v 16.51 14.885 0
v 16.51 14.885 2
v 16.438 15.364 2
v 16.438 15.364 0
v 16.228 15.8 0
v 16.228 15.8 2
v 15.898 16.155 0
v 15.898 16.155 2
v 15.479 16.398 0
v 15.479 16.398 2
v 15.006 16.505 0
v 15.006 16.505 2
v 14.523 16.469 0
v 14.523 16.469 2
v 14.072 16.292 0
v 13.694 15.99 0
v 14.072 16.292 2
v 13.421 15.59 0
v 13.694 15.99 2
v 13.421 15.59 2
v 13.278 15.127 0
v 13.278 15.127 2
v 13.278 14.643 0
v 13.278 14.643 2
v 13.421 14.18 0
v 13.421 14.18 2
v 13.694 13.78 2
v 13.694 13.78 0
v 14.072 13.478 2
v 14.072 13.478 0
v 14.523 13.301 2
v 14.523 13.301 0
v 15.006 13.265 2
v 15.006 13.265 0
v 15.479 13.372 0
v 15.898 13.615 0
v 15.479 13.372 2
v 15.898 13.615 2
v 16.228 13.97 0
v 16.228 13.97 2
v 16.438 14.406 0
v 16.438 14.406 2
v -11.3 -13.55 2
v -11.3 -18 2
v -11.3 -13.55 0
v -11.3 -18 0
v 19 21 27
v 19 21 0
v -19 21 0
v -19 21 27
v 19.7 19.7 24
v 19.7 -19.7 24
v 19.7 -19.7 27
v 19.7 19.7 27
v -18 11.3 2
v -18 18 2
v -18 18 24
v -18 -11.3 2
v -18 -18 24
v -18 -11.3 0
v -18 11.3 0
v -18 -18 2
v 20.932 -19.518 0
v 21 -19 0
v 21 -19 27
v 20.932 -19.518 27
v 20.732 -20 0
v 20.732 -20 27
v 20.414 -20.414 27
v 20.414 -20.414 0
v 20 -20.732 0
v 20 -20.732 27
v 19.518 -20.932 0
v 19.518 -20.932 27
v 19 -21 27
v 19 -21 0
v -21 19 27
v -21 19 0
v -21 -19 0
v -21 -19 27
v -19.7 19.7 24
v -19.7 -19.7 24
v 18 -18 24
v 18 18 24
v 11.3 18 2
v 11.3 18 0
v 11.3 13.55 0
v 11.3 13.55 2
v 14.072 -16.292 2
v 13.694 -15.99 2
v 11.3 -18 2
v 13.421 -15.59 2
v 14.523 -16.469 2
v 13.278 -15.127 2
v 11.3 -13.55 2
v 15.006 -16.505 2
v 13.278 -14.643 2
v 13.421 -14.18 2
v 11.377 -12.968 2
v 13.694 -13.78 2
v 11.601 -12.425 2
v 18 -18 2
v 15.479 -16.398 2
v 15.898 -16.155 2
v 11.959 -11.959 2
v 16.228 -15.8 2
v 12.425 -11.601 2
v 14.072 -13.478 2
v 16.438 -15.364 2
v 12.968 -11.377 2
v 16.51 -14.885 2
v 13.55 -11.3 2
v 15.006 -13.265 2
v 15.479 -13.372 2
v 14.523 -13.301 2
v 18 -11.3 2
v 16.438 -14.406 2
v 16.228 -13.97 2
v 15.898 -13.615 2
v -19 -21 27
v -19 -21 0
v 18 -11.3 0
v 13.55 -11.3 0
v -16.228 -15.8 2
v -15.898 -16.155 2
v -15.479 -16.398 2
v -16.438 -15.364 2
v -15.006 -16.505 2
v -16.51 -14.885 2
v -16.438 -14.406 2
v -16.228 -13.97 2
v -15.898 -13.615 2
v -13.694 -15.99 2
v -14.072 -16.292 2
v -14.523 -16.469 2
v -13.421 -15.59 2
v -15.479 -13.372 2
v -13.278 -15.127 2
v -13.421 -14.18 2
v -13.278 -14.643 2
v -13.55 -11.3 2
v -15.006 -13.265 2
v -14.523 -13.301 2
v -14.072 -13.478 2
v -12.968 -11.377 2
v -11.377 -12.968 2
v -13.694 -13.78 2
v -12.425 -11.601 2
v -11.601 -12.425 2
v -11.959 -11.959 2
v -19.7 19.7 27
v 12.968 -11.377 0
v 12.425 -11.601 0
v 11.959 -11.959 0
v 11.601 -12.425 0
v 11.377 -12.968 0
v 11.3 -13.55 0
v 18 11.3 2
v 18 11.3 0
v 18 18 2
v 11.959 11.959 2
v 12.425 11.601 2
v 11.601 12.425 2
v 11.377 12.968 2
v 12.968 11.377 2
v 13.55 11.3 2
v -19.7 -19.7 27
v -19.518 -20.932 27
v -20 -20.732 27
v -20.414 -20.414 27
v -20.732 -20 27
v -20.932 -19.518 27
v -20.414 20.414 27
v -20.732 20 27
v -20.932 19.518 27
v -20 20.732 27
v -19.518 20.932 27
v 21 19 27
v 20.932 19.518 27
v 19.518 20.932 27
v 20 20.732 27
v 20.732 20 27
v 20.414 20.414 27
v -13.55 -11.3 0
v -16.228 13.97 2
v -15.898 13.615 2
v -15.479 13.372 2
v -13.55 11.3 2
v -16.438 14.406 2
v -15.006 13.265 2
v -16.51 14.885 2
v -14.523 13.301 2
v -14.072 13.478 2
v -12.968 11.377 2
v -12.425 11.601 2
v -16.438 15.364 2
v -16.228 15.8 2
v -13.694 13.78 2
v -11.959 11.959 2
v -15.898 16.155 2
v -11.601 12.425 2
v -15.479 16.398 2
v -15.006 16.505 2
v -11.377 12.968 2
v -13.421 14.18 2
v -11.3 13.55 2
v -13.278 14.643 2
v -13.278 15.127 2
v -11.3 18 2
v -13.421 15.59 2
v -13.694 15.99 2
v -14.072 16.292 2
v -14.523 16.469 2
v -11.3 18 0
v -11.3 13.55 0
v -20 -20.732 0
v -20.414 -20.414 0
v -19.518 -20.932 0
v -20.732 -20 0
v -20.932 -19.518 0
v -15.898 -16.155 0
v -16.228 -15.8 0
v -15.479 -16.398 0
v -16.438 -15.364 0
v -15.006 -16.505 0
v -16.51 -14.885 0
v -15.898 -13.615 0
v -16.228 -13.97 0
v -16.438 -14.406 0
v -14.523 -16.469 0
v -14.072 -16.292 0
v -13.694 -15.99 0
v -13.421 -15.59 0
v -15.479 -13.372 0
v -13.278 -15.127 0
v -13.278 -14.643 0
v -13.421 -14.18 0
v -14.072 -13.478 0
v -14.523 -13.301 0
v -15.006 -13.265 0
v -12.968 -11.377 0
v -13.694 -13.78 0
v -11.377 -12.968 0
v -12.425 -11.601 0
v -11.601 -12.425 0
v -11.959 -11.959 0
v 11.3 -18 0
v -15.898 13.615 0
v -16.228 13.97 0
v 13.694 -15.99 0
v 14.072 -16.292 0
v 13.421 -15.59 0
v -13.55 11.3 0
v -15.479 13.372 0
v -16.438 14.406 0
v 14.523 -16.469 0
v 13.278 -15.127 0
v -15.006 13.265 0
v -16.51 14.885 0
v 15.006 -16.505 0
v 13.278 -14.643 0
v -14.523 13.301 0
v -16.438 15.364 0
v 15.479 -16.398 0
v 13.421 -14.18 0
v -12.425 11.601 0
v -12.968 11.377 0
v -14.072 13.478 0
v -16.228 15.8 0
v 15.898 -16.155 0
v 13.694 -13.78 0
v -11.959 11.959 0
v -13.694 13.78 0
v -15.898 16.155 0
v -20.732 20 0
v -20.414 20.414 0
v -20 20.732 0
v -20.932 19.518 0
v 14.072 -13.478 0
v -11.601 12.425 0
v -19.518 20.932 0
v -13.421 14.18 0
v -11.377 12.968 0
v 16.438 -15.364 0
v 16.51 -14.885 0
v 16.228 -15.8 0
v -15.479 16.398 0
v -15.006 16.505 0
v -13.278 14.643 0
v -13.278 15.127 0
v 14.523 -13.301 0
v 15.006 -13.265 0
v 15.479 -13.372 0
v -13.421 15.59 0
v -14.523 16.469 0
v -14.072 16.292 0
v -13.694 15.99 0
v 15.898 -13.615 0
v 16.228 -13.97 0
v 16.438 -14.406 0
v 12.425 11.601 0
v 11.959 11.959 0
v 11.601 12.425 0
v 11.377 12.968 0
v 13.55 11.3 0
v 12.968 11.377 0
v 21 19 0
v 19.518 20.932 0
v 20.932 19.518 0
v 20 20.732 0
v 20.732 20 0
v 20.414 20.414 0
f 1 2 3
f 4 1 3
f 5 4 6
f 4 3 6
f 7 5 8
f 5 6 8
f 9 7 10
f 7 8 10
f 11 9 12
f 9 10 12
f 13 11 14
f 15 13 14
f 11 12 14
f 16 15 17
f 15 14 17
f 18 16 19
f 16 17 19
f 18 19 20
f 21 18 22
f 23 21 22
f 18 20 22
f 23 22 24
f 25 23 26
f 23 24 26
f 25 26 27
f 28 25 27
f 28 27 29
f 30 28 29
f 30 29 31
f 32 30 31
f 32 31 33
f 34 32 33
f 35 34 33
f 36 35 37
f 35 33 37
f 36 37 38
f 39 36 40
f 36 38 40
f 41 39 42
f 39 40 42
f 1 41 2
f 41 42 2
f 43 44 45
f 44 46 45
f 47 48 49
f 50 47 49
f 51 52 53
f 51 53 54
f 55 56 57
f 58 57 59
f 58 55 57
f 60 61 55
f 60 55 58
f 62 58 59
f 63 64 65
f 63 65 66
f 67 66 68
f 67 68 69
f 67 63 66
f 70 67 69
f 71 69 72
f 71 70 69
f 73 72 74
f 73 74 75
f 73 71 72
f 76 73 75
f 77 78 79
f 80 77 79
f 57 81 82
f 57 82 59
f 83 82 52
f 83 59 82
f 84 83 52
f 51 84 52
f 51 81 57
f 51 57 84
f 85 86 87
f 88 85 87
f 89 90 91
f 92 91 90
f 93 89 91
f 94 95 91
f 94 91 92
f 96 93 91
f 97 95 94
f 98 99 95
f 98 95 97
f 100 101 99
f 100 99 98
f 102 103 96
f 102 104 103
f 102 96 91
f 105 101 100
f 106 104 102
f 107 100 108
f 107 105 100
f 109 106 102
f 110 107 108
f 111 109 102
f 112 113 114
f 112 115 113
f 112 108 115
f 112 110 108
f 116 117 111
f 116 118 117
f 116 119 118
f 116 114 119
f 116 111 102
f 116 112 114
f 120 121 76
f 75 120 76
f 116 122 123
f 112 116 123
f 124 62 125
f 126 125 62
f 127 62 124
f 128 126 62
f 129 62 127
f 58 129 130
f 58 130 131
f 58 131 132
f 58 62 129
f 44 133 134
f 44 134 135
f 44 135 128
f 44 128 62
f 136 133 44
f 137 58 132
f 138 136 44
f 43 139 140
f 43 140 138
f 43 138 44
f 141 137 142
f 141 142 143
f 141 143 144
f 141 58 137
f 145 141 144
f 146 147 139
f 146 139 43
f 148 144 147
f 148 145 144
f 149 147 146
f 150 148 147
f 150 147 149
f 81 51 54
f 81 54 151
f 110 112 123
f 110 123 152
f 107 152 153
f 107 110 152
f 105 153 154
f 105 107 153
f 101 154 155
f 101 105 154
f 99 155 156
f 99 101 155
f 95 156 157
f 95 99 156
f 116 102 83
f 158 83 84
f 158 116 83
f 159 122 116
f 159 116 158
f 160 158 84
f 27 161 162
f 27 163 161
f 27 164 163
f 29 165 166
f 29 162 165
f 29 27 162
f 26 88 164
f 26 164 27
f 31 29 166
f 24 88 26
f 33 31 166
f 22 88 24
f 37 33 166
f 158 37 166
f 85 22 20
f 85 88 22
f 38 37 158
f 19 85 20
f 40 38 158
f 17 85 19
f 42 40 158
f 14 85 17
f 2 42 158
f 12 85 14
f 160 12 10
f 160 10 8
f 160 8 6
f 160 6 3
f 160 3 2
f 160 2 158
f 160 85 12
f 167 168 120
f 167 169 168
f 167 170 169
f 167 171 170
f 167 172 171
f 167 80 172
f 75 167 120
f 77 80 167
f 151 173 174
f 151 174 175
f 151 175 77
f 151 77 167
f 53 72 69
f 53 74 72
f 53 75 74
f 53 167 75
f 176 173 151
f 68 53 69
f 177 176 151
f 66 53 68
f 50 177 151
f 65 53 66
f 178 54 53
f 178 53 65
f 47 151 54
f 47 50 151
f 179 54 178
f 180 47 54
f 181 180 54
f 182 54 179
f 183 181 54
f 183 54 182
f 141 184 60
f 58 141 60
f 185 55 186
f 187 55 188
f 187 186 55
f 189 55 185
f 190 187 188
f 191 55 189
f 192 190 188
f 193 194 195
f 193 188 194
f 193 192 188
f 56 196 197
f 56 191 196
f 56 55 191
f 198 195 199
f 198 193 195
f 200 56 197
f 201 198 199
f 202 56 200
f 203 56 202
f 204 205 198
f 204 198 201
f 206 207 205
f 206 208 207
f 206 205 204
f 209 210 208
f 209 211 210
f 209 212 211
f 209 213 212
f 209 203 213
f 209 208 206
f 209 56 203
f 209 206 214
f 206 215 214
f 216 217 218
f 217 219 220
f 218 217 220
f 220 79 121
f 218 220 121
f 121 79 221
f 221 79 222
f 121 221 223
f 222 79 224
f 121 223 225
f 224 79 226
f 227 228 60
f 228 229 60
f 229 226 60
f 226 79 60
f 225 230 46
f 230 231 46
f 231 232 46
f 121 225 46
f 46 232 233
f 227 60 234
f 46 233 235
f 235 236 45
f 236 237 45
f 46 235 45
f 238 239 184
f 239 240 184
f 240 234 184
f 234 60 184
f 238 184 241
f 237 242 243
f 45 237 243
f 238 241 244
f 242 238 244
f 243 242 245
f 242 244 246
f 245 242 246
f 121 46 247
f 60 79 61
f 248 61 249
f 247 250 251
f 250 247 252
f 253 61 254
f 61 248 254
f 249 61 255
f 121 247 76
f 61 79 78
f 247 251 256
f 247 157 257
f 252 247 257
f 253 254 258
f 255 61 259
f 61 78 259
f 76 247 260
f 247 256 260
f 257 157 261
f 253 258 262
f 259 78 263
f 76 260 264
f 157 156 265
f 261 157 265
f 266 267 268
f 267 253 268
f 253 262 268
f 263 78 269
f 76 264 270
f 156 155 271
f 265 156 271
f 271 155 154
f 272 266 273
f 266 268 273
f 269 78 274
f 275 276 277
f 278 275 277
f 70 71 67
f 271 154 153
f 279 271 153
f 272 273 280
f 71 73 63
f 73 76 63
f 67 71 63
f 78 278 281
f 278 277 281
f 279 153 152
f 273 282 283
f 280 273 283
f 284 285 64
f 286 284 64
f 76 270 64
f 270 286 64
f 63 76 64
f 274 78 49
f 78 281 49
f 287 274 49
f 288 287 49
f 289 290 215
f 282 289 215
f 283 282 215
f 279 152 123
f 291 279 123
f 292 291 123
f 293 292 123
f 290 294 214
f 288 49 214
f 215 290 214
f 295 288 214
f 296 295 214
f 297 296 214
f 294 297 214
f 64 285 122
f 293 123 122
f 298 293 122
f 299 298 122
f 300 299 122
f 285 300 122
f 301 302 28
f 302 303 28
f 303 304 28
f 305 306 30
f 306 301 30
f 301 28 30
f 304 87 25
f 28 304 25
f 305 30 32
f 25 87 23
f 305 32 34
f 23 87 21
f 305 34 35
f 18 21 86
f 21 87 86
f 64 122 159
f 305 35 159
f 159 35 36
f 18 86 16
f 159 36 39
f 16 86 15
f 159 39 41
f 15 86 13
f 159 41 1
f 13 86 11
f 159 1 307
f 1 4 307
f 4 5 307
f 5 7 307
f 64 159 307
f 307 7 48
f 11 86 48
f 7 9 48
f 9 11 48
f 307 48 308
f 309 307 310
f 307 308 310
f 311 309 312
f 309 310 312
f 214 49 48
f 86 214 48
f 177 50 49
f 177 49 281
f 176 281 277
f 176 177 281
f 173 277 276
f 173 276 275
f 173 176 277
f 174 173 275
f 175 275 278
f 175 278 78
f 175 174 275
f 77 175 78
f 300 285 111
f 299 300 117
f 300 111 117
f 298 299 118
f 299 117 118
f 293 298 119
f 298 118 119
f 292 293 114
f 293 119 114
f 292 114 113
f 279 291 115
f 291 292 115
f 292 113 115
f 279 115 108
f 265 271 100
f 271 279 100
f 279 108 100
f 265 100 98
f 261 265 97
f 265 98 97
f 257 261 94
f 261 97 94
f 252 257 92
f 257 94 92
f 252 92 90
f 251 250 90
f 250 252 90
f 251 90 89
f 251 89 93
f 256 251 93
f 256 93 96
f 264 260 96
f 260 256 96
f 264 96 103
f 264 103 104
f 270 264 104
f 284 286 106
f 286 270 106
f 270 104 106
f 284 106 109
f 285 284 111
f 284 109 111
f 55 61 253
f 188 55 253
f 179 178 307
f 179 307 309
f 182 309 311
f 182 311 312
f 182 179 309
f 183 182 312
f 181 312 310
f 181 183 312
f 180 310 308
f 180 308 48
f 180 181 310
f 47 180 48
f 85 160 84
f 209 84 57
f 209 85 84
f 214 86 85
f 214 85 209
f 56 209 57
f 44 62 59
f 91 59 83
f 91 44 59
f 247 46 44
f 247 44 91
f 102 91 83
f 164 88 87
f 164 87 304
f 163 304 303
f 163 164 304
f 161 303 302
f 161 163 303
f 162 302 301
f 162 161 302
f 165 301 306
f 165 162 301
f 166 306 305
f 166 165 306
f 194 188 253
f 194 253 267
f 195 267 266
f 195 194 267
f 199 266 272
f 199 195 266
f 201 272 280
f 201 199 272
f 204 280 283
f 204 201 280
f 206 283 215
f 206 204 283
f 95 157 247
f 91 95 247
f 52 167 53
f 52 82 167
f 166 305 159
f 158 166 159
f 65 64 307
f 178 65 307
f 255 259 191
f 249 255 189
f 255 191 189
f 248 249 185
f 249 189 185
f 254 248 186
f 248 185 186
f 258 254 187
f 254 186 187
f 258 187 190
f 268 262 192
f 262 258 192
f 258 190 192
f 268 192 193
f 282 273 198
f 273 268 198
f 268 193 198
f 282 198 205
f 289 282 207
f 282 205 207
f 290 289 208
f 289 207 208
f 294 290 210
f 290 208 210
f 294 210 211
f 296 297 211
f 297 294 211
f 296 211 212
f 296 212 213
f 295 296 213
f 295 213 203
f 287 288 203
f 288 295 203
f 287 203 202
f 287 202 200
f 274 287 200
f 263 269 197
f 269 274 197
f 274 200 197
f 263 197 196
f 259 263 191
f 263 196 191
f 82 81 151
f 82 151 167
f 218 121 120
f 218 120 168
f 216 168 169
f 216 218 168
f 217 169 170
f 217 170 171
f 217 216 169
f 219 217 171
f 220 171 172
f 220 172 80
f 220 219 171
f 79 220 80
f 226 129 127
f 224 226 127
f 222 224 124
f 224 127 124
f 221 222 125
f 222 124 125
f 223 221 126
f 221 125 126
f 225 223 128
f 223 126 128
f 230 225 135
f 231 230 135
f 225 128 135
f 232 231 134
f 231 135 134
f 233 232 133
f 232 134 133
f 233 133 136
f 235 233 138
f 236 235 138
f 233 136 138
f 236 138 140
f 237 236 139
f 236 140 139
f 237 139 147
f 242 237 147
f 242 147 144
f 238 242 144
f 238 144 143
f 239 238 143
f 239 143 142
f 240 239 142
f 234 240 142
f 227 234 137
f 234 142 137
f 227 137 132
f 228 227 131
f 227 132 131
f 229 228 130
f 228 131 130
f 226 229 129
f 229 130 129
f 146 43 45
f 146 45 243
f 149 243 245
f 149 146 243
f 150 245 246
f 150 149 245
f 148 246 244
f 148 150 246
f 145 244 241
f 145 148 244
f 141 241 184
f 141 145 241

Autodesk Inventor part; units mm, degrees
ref_plane "YZ Plane" through (0, 0, 0) normal (1, 0, 0) x (0, 1, 0)
ref_plane "XZ Plane" through (0, 0, 0) normal (0, 1, 0) x (-1, 0, 0)
ref_plane "XY Plane" through (0, 0, 0) normal (0, 0, 1) x (1, 0, 0)
sketch "Sketch1" plane through (0, 0, 0) normal (0, 0, 1) x (1, 0, 0)
  line L0 (-21, -21) -> (21, -21)
  line L1 (21, -21) -> (21, 21)
  line L2 (21, 21) -> (-21, 21)
  line L3 (-21, 21) -> (-21, -21)
  line L4 (-21, -21) -> (21, 21) construction
  line L5 (21, -21) -> (-21, 21) construction
  line L6 (-18, -18) -> (18, -18)
  line L7 (18, -18) -> (18, 18)
  line L8 (18, 18) -> (-18, 18)
  line L9 (-18, 18) -> (-18, -18)
  line L10 (-18, -18) -> (18, 18) construction
  line L11 (18, -18) -> (-18, 18) construction
  line L12 (18, 18) -> (13.26, 18)
  line L13 (13.26, 18) -> (13.26, 13.26)
  line L14 (13.26, 13.26) -> (18, 13.26)
  line L15 (18, 13.26) -> (18, 18)
  line L16 (18, 18) -> (14.885, 18)
  line L17 (14.885, 18) -> (14.885, 14.885)
  line L18 (14.885, 14.885) -> (18, 14.885)
  line L19 (18, 14.885) -> (18, 18)
  circle A0 centre (14.885, 14.885) radius 1.625
  line L20 (18, 18) -> (11.3, 18)
  line L21 (11.3, 18) -> (11.3, 11.3)
  line L22 (11.3, 11.3) -> (18, 11.3)
  line L23 (18, 11.3) -> (18, 18)
  circle A1 centre (13.26, 13.26) radius 1.96
  point P0 (0, 0)
  dimension "d0" = 42
  dimension "d1" = 42
  dimension "d2" = 36
  dimension "d3" = 36
  dimension "d4" = 4.74
  dimension "d5" = 4.74
  dimension "d6" = 3.115
  dimension "d7" = 6.7
  dimension "d8" = 6.7
extrude "Extrusion1" add sketch "Sketch1" along normal blind 2 contours L3 L2 L1 L0 | L22 A1 L14 L7 | L8 L13 A1 L21 | L14 A1 A0 L18 L7 | L22 L21 A1 | A1 L13 L14 | L8 L17 A0 A1 L13 | L18 A0 L17 L8 L7 | L14 A0 A1 | A1 A0 L13 | A0 A1 L17 L18 | L18 L17 A0 | L14 L13 A0 | A0 A1
mirror "Mirror1" about plane through (0, 0, 0) normal (1, 0, 0) of "Extrusion1"
mirror "Mirror2" about plane through (0, 0, 0) normal (0, 1, 0) of "Extrusion1", "Mirror1"
fillet "Fillet1" radius 2.25 4 edges at (-11.3, 11.3, 1) (11.3, 11.3, 1) (11.3, -11.3, 1) (-11.3, -11.3, 1)
sketch "Sketch2" plane through (0, 0, 2) normal (0, 0, 1) x (1, 0, 0)
  line L0 (21, -21) -> (21, 21) projected
  line L1 (21, 21) -> (14.885, 21)
  line L2 (14.885, 21) -> (14.885, 14.885)
  line L3 (14.885, 14.885) -> (21, 14.885)
  line L4 (21, 14.885) -> (21, 21)
  circle A0 centre (14.885, 14.885) radius 1.625
  point P0 (0, 0)
  dimension "d12" = 6.115
  dimension "d13" = 6.115
  dimension "d14" = 3.25
extrude "Extrusion2" cut sketch "Sketch2" against normal blind 2 contours A0 L2 L3 | L3 L2 A0
mirror "Mirror3" about plane through (0, 0, 0) normal (0, 1, 0) of "Extrusion2"
mirror "Mirror4" about plane through (0, 0, 0) normal (1, 0, 0) of "Extrusion2", "Mirror3"
sketch "Sketch3" plane through (0, 0, 2) normal (0, 0, 1) x (1, 0, 0)
  line L0 (-18, -18) -> (18, -18)
  line L1 (18, -18) -> (18, 18)
  line L2 (18, 18) -> (-18, 18)
  line L3 (-18, 18) -> (-18, -18)
  line L4 (-18, -18) -> (18, 18) construction
  line L5 (18, -18) -> (-18, 18) construction
  line L6 (21, 21) -> (-21, 21) projected
  line L7 (-21, -21) -> (21, -21)
  line L8 (21, -21) -> (21, 21)
  line L9 (21, 21) -> (-21, 21)
  line L10 (-21, 21) -> (-21, -21)
  line L11 (-21, -21) -> (21, 21) construction
  line L12 (21, -21) -> (-21, 21) construction
  point P0 (0, 0)
  dimension "d17" = 36
  dimension "d18" = 36
extrude "Extrusion3" add sketch "Sketch3" along normal blind 22
sketch "Sketch4" plane through (0, 0, 24) normal (0, 0, 1) x (1, 0, 0)
  line L0 (21, 21) -> (-21, 21) projected
  line L1 (-21, -21) -> (21, -21)
  line L2 (21, -21) -> (21, 21)
  line L3 (21, 21) -> (-21, 21)
  line L4 (-21, 21) -> (-21, -21)
  line L5 (-21, -21) -> (21, 21) construction
  line L6 (21, -21) -> (-21, 21) construction
  line L7 (-19.7, -19.7) -> (19.7, -19.7)
  line L8 (19.7, -19.7) -> (19.7, 19.7)
  line L9 (19.7, 19.7) -> (-19.7, 19.7)
  line L10 (-19.7, 19.7) -> (-19.7, -19.7)
  line L11 (-19.7, -19.7) -> (19.7, 19.7) construction
  line L12 (19.7, -19.7) -> (-19.7, 19.7) construction
  point P0 (0, 0)
  dimension "d21" = 39.4
  dimension "d22" = 39.4
extrude "Extrusion4" add sketch "Sketch4" along normal blind 3
fillet "Fillet2" radius 2 4 edges at (21, -21, 13.5) (21, 21, 13.5) (-21, 21, 13.5) (-21, -21, 13.5)
properties part number "camerashield"
